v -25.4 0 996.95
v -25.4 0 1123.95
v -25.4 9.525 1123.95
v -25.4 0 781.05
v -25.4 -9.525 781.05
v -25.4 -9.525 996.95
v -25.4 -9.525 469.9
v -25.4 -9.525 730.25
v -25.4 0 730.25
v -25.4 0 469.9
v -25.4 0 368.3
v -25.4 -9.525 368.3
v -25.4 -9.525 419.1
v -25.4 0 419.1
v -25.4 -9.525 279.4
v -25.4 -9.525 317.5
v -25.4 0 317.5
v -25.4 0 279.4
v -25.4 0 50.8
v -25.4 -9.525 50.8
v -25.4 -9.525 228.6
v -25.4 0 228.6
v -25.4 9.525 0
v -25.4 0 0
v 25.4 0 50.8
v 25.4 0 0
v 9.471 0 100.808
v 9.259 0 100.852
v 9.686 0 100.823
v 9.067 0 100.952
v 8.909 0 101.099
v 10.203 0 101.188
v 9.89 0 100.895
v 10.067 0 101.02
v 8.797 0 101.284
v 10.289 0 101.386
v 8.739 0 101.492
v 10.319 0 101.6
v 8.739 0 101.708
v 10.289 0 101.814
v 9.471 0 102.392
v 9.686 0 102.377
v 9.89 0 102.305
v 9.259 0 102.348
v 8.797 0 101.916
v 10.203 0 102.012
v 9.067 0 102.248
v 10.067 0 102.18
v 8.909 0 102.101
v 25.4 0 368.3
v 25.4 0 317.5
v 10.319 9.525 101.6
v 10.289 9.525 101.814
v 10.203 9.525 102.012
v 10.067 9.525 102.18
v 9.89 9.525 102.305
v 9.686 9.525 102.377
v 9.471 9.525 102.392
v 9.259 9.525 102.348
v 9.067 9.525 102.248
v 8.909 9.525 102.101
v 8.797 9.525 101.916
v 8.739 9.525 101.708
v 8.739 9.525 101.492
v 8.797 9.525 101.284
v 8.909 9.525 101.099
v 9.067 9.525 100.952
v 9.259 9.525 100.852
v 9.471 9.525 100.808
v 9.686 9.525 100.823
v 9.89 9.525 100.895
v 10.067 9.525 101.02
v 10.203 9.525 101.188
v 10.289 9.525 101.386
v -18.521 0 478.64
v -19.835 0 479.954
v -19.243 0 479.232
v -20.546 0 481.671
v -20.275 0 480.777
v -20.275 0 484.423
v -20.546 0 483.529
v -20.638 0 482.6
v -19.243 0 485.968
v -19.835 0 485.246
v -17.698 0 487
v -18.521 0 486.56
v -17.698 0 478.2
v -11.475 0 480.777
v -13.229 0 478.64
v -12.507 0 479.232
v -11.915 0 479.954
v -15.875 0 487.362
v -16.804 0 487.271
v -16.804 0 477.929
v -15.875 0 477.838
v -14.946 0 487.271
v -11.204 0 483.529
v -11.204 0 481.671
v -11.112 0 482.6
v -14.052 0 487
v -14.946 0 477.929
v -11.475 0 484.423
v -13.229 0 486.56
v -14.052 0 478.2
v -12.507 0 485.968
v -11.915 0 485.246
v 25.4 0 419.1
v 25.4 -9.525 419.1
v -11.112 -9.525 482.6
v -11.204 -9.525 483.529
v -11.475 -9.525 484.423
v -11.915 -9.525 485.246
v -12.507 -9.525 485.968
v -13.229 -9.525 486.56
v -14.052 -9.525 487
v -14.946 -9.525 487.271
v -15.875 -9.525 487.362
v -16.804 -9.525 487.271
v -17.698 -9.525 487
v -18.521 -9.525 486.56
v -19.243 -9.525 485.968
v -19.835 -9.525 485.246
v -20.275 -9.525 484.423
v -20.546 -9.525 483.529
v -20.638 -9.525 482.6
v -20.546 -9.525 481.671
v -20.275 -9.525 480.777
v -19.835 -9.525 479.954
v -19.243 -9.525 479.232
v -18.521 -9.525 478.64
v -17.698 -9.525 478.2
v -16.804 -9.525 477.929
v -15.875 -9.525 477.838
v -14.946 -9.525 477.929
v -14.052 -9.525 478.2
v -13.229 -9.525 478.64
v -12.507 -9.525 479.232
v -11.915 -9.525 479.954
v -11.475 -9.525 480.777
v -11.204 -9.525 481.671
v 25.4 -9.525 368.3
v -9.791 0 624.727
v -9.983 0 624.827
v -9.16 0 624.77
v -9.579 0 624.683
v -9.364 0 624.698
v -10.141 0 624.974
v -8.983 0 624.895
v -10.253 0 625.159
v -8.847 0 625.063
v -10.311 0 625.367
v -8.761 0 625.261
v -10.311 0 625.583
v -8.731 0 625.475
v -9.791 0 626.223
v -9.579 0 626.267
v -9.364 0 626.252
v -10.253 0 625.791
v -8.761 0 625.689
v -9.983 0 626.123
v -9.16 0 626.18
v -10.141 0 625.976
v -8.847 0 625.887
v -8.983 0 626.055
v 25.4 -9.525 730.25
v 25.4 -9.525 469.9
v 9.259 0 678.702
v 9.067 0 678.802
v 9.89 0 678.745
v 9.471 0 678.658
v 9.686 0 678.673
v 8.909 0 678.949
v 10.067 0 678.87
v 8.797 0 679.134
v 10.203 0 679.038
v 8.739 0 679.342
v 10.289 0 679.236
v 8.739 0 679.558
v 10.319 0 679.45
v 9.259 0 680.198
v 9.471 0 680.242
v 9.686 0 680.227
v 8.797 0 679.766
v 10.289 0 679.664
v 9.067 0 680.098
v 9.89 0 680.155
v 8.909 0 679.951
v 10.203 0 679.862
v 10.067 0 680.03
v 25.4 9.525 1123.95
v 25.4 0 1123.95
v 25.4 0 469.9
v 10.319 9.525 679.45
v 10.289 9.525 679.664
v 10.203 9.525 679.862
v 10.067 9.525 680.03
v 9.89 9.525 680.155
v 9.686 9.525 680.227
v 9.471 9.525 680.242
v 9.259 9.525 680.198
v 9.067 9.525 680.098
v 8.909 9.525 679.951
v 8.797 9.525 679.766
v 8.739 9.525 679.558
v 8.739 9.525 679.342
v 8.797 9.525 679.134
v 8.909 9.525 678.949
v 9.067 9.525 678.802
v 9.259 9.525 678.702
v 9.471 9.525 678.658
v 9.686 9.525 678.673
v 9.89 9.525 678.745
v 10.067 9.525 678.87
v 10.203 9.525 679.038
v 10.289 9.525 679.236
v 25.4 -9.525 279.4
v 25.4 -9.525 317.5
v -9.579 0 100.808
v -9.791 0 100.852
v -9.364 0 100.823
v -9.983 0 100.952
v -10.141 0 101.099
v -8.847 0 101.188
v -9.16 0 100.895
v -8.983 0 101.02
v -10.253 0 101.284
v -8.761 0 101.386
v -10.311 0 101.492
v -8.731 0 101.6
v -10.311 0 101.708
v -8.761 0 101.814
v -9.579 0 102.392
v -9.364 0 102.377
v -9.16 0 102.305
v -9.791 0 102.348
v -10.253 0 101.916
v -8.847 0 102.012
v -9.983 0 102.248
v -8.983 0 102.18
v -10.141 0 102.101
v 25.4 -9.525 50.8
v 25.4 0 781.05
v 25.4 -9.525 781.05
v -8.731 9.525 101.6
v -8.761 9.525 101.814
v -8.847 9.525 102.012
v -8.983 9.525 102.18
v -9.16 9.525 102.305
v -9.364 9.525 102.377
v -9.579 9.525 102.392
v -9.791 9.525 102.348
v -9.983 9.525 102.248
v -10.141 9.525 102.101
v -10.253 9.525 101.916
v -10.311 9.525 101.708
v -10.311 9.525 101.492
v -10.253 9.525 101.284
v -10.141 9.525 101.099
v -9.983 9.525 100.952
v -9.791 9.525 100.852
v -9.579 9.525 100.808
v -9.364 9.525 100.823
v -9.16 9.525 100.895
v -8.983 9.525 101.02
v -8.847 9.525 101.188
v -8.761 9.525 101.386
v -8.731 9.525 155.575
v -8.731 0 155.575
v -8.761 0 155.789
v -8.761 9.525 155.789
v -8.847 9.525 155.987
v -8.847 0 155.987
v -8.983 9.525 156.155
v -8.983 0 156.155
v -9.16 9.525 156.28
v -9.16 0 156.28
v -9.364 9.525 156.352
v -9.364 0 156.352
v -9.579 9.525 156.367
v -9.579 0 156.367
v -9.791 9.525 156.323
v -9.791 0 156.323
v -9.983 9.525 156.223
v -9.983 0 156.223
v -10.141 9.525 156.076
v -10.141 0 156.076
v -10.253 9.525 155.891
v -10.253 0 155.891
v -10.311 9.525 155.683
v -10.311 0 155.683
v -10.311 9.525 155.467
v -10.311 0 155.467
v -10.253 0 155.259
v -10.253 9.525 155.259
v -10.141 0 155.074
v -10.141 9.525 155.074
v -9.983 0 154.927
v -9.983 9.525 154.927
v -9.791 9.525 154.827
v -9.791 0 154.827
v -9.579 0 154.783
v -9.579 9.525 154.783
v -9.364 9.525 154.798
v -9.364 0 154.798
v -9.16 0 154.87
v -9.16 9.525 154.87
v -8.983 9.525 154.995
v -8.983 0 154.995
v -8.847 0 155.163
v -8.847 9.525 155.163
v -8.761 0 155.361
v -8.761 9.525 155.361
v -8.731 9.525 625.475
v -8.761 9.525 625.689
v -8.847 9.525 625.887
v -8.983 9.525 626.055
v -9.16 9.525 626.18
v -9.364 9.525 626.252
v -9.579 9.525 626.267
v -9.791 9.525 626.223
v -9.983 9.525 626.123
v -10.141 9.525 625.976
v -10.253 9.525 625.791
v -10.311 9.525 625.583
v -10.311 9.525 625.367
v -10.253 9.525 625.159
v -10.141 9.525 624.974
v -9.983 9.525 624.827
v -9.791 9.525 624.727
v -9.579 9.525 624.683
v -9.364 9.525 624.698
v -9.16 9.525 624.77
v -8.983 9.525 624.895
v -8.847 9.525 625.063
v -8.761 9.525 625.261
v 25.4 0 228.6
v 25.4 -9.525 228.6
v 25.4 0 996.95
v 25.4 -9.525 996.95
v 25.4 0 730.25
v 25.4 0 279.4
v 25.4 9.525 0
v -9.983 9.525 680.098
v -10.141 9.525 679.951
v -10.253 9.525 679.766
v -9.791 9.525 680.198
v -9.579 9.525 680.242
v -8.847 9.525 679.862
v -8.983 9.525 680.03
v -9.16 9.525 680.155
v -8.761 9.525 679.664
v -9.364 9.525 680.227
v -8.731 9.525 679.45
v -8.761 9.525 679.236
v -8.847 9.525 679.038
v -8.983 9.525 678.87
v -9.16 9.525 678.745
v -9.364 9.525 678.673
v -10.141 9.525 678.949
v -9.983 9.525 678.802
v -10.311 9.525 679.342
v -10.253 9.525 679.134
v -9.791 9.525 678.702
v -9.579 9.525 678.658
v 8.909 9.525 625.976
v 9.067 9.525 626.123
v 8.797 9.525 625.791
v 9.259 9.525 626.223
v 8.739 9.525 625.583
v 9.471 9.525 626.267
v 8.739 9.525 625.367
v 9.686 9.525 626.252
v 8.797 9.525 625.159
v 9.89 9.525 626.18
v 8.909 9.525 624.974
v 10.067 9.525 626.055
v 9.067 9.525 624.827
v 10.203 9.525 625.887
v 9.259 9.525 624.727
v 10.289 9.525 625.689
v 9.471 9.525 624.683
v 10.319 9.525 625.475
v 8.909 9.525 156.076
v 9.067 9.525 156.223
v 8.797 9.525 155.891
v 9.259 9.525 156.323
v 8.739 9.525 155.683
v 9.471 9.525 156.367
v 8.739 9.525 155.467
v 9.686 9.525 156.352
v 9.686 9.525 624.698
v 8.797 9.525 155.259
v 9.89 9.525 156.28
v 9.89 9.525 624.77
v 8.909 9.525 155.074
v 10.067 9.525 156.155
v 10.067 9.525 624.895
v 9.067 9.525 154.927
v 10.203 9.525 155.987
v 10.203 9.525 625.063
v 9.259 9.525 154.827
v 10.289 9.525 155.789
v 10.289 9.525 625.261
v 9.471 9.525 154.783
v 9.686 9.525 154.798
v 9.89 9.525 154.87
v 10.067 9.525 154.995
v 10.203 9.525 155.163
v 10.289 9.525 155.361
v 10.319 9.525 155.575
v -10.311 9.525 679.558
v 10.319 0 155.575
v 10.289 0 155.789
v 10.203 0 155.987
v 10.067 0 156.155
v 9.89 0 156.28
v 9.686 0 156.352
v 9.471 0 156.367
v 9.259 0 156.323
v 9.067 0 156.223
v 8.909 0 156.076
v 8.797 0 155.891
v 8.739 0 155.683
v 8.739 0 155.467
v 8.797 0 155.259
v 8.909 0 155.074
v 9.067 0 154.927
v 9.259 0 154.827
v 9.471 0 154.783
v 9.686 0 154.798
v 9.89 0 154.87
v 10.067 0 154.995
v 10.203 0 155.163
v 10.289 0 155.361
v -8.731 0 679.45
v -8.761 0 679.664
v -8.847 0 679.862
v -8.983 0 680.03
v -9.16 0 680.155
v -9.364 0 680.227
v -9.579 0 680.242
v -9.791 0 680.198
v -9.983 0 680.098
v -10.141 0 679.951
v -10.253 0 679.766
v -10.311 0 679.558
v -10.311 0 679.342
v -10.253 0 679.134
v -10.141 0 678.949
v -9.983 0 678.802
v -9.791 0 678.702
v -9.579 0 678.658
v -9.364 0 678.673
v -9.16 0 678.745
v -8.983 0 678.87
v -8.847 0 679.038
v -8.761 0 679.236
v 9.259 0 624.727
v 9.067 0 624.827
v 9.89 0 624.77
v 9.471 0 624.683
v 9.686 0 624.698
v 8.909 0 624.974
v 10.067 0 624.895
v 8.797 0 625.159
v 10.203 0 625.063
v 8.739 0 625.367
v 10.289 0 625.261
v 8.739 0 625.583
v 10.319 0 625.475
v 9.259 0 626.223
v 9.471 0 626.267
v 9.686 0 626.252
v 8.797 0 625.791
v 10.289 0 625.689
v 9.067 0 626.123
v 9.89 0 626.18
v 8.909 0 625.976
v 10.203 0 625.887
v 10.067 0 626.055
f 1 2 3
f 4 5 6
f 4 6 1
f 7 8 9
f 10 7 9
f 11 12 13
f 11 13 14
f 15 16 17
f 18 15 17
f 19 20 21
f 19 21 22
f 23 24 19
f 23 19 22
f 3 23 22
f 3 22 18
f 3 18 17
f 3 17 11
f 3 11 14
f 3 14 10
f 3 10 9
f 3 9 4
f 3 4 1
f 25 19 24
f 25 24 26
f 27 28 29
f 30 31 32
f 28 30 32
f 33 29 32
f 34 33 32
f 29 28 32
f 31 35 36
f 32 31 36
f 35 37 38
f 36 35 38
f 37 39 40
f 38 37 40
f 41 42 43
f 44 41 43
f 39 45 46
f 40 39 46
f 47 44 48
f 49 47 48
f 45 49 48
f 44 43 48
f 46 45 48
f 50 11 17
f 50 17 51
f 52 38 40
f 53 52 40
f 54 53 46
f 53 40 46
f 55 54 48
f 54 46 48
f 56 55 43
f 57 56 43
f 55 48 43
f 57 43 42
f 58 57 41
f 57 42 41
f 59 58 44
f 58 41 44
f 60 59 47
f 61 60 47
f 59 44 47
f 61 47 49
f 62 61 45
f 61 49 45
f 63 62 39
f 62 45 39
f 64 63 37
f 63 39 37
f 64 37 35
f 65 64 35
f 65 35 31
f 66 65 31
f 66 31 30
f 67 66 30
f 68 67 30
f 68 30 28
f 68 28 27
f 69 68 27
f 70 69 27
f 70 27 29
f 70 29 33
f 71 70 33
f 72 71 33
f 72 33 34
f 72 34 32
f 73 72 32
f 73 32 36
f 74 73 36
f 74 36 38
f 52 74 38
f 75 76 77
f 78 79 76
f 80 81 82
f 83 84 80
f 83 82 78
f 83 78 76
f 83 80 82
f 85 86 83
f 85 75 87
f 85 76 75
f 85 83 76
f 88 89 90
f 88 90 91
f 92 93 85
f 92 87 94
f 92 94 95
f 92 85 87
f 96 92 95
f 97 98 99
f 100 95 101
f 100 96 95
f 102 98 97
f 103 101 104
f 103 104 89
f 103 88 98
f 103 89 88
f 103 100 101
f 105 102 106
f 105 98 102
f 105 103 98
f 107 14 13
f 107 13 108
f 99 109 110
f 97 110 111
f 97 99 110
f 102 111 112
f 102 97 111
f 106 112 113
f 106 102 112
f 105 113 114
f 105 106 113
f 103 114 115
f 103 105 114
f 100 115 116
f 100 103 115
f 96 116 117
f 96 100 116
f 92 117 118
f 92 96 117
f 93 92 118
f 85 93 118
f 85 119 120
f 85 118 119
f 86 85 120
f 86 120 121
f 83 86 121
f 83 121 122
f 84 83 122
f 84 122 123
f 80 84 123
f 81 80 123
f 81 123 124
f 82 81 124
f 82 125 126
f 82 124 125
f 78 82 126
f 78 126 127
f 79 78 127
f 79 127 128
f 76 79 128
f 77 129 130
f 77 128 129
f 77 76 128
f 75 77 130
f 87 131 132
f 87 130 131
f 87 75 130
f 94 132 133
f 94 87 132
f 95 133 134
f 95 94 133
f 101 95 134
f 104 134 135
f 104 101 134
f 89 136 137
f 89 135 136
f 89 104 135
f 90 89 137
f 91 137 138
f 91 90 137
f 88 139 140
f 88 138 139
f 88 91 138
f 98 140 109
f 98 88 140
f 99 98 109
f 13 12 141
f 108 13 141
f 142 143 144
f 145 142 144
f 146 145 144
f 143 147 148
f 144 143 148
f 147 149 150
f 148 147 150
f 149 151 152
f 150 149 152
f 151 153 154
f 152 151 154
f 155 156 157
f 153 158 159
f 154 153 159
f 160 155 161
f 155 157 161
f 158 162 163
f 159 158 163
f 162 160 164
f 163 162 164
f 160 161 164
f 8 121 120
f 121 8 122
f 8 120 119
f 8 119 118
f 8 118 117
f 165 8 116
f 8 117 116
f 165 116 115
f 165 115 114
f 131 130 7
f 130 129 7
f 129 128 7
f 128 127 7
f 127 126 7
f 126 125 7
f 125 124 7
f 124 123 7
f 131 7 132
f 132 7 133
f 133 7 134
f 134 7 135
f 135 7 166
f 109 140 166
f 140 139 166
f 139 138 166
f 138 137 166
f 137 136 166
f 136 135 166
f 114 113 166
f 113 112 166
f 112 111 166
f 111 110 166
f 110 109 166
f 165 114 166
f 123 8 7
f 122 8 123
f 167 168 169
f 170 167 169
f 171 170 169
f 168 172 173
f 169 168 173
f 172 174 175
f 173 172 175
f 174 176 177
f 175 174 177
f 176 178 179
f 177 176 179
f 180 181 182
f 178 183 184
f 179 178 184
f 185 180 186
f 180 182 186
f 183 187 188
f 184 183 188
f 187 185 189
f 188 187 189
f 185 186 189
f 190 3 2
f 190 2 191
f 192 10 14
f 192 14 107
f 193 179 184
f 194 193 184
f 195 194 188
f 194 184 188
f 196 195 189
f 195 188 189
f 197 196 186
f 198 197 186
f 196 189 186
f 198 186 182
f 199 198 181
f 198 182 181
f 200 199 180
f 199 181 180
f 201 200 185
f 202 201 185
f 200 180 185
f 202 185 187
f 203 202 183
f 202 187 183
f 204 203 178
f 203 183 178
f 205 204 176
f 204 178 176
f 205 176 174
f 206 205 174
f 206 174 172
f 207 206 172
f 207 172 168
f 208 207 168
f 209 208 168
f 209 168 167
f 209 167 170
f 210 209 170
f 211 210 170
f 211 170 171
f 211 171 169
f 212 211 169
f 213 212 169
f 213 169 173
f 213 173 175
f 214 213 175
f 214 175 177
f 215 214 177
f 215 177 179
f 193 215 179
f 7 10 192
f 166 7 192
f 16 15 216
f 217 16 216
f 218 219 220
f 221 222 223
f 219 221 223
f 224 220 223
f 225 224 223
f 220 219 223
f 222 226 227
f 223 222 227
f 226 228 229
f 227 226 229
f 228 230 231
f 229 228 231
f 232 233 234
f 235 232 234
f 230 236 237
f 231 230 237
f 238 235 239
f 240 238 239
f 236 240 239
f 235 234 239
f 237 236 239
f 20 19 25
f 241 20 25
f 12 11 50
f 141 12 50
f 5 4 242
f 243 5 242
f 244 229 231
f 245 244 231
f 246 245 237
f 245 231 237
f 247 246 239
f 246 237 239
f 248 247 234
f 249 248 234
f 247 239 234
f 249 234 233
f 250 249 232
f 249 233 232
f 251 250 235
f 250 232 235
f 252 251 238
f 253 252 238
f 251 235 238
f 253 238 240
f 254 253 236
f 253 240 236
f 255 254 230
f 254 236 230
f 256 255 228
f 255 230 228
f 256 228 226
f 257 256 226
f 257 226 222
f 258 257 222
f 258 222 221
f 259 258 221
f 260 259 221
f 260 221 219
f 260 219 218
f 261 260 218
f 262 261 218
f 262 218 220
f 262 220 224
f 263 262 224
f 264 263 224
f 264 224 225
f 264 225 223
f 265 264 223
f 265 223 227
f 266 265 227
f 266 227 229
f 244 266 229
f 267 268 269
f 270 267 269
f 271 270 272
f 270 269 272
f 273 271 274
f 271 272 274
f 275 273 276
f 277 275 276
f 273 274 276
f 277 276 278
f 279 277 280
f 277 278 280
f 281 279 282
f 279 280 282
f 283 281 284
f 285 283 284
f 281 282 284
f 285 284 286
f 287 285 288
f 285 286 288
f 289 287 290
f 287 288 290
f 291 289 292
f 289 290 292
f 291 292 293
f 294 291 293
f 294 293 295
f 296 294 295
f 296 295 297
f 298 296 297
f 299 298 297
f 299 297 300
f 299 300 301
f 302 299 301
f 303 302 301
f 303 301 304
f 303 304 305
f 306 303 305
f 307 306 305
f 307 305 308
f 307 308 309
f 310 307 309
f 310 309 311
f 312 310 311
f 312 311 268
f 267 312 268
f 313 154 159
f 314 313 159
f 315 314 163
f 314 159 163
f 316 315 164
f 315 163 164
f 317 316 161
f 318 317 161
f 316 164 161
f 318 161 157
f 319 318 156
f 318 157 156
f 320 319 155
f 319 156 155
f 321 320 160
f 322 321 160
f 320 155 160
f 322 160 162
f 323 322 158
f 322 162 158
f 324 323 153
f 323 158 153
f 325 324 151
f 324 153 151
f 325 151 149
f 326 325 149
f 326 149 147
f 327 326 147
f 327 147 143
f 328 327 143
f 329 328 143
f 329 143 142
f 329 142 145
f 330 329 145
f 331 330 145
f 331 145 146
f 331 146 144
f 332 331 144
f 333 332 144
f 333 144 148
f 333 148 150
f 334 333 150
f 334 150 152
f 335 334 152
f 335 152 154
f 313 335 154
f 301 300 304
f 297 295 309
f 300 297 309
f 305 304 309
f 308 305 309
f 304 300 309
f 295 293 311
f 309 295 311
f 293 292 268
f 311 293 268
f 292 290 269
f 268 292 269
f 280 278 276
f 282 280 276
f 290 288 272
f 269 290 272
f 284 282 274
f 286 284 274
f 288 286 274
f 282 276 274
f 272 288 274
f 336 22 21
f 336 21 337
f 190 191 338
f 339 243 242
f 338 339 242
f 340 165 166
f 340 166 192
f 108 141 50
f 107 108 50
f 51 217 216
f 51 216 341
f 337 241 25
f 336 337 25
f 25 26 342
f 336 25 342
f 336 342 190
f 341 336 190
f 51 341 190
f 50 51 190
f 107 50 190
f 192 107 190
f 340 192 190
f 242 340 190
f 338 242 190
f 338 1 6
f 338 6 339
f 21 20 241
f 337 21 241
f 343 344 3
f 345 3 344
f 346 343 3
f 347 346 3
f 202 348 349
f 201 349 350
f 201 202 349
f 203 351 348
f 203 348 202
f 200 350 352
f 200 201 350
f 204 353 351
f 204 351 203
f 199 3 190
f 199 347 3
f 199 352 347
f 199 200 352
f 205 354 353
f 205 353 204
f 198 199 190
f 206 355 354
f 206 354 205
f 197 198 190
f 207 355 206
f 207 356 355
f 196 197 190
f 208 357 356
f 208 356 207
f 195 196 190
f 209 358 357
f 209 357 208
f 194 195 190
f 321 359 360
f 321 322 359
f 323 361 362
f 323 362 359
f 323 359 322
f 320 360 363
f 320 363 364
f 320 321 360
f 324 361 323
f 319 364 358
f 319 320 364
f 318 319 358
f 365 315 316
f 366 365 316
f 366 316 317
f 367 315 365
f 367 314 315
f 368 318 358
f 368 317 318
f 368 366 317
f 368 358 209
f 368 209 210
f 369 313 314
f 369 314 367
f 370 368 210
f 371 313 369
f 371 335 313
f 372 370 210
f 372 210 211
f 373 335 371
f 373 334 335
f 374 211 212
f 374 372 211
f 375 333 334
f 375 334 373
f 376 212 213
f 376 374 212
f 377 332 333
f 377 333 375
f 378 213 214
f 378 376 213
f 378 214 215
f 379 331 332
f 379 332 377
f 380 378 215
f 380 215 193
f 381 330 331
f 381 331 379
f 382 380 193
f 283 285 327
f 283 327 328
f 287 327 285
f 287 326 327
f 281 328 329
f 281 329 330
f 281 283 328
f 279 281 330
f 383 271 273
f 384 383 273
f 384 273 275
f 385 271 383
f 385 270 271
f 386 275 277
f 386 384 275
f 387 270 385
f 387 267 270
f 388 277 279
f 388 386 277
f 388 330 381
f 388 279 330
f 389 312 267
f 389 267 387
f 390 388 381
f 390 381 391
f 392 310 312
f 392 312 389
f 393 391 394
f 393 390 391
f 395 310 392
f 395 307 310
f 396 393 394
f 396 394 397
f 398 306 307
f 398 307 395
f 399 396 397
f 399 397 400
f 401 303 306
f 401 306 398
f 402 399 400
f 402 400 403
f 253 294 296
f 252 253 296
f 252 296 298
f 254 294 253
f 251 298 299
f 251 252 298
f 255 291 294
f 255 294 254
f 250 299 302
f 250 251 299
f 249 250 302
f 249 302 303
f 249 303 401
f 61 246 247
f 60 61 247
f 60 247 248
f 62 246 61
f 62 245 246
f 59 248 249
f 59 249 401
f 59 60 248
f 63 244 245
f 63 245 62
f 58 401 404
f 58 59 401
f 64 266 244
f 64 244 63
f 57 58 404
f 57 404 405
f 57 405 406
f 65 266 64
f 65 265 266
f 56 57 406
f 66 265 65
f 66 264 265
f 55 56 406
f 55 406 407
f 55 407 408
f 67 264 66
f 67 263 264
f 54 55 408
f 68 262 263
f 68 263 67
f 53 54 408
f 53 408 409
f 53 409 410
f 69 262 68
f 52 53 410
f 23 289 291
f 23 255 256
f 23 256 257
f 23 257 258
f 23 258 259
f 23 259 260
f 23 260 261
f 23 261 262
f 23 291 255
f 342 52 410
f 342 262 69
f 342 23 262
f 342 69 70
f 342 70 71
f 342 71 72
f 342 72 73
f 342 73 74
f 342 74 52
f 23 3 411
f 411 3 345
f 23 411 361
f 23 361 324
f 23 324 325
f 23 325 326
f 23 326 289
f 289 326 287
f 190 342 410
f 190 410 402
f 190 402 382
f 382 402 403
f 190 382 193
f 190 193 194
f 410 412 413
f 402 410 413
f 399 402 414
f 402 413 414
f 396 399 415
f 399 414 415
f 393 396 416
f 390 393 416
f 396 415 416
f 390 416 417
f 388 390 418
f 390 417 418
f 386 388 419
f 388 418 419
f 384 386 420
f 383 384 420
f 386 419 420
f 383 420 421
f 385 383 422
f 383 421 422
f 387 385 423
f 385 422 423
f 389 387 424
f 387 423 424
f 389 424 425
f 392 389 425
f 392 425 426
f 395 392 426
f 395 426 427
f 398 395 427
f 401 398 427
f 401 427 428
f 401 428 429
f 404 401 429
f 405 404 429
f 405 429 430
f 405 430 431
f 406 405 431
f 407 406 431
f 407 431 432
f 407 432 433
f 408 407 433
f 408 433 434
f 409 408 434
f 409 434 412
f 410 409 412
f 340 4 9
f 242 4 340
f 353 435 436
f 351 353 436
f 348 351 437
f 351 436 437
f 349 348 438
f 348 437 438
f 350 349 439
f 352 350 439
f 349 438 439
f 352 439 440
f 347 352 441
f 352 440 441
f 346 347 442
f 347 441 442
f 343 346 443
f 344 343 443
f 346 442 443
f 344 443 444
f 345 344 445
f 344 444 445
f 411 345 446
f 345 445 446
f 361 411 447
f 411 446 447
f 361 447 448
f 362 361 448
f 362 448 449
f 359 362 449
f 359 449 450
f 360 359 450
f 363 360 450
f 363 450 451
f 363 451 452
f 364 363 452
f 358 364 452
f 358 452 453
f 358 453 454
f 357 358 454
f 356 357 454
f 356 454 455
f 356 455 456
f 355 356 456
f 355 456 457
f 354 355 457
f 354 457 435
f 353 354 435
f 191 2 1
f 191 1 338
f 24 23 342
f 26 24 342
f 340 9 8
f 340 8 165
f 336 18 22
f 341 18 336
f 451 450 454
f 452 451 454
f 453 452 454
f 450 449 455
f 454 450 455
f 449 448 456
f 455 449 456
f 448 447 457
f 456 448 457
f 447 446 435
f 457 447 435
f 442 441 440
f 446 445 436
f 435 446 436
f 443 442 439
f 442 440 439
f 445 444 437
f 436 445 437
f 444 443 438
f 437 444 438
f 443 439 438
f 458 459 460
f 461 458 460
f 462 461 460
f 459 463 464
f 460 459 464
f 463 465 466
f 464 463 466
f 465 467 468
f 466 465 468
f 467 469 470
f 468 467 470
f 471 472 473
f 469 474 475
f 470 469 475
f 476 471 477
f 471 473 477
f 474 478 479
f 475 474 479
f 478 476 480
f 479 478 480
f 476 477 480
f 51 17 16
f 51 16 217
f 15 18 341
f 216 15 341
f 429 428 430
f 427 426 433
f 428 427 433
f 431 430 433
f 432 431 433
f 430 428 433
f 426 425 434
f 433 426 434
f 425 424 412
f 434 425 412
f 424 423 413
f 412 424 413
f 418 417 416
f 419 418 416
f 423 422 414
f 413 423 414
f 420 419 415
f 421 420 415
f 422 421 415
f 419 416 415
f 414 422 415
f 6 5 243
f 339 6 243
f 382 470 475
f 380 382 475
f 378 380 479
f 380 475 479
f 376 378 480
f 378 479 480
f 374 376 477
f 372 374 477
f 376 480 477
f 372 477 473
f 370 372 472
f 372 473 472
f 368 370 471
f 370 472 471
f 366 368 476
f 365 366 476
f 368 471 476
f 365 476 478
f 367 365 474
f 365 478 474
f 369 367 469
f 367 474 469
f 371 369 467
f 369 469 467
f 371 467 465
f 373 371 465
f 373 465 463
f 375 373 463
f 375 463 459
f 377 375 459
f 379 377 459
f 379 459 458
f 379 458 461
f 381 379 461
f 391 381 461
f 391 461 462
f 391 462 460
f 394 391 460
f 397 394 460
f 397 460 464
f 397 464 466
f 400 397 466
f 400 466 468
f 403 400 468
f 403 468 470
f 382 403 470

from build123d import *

# Parameters (mm, degrees)
F0_W     = 50.8
F0_H     = 19.05
F1_DEPTH = 1123.95
F2_W     = 122.435573
F2_H     = 50.8
F2_W_2   = 108.831619
F2_W_3   = 93.867282
F2_W_4   = 145.562325
F2_W_5   = 343.160421
F2_H_2   = 127
F2_W_6   = 155.851283
F3_DEPTH = 25.4
F4_R     = 0.79375
F5_DEPTH = 25.4
F6_R     = 4.7625
F7_DEPTH = 25.4


with BuildPart() as f1:
    # F0 (on Top) → F1 (new body)
    with BuildSketch(Plane.XY):
        Rectangle(F0_W, F0_H)
    extrude(amount=F1_DEPTH)

    # F2 (on Front) → F3 (cut)
    with BuildSketch(Plane.XZ):
        with Locations((22.446524, 25.4)):
            Rectangle(F2_W, F2_H)
        with Locations((-4.761385, 342.9)):
            Rectangle(F2_W_2, F2_H)
        with Locations((2.720783, 755.65)):
            Rectangle(F2_W_3, F2_H)
        with Locations((-1.360391, 444.5)):
            Rectangle(F2_W_4, F2_H)
        with Locations((-38.781822, 1060.45)):
            Rectangle(F2_W_5, F2_H_2)
        with Locations((-12.806606, 254)):
            Rectangle(F2_W_6, F2_H)
    extrude(amount=F3_DEPTH, mode=Mode.SUBTRACT)

    # F4 (on Front) → F5 (cut)
    with BuildSketch(Plane.XZ):
        with Locations((9.525, 101.6)):
            Circle(F4_R)
        with Locations((9.525, 155.575)):
            Circle(F4_R)
        with Locations((9.525, 625.475)):
            Circle(F4_R)
        with Locations((9.525, 679.45)):
            Circle(F4_R)
        with Locations((-9.525, 625.475)):
            Circle(F4_R)
        with Locations((-9.525, 679.45)):
            Circle(F4_R)
        with Locations((-9.525, 101.6)):
            Circle(F4_R)
        with Locations((-9.525, 155.575)):
            Circle(F4_R)
    extrude(amount=-F5_DEPTH, mode=Mode.SUBTRACT)

    # F6 (on Front) → F7 (cut)
    with BuildSketch(Plane.XZ):
        with Locations((15.875, 254)):
            Circle(F6_R)
        with Locations((-15.875, 254)):
            Circle(F6_R)
        with Locations((-15.875, 482.6)):
            Circle(F6_R)
    extrude(amount=F7_DEPTH, mode=Mode.SUBTRACT)


solid = f1.part
